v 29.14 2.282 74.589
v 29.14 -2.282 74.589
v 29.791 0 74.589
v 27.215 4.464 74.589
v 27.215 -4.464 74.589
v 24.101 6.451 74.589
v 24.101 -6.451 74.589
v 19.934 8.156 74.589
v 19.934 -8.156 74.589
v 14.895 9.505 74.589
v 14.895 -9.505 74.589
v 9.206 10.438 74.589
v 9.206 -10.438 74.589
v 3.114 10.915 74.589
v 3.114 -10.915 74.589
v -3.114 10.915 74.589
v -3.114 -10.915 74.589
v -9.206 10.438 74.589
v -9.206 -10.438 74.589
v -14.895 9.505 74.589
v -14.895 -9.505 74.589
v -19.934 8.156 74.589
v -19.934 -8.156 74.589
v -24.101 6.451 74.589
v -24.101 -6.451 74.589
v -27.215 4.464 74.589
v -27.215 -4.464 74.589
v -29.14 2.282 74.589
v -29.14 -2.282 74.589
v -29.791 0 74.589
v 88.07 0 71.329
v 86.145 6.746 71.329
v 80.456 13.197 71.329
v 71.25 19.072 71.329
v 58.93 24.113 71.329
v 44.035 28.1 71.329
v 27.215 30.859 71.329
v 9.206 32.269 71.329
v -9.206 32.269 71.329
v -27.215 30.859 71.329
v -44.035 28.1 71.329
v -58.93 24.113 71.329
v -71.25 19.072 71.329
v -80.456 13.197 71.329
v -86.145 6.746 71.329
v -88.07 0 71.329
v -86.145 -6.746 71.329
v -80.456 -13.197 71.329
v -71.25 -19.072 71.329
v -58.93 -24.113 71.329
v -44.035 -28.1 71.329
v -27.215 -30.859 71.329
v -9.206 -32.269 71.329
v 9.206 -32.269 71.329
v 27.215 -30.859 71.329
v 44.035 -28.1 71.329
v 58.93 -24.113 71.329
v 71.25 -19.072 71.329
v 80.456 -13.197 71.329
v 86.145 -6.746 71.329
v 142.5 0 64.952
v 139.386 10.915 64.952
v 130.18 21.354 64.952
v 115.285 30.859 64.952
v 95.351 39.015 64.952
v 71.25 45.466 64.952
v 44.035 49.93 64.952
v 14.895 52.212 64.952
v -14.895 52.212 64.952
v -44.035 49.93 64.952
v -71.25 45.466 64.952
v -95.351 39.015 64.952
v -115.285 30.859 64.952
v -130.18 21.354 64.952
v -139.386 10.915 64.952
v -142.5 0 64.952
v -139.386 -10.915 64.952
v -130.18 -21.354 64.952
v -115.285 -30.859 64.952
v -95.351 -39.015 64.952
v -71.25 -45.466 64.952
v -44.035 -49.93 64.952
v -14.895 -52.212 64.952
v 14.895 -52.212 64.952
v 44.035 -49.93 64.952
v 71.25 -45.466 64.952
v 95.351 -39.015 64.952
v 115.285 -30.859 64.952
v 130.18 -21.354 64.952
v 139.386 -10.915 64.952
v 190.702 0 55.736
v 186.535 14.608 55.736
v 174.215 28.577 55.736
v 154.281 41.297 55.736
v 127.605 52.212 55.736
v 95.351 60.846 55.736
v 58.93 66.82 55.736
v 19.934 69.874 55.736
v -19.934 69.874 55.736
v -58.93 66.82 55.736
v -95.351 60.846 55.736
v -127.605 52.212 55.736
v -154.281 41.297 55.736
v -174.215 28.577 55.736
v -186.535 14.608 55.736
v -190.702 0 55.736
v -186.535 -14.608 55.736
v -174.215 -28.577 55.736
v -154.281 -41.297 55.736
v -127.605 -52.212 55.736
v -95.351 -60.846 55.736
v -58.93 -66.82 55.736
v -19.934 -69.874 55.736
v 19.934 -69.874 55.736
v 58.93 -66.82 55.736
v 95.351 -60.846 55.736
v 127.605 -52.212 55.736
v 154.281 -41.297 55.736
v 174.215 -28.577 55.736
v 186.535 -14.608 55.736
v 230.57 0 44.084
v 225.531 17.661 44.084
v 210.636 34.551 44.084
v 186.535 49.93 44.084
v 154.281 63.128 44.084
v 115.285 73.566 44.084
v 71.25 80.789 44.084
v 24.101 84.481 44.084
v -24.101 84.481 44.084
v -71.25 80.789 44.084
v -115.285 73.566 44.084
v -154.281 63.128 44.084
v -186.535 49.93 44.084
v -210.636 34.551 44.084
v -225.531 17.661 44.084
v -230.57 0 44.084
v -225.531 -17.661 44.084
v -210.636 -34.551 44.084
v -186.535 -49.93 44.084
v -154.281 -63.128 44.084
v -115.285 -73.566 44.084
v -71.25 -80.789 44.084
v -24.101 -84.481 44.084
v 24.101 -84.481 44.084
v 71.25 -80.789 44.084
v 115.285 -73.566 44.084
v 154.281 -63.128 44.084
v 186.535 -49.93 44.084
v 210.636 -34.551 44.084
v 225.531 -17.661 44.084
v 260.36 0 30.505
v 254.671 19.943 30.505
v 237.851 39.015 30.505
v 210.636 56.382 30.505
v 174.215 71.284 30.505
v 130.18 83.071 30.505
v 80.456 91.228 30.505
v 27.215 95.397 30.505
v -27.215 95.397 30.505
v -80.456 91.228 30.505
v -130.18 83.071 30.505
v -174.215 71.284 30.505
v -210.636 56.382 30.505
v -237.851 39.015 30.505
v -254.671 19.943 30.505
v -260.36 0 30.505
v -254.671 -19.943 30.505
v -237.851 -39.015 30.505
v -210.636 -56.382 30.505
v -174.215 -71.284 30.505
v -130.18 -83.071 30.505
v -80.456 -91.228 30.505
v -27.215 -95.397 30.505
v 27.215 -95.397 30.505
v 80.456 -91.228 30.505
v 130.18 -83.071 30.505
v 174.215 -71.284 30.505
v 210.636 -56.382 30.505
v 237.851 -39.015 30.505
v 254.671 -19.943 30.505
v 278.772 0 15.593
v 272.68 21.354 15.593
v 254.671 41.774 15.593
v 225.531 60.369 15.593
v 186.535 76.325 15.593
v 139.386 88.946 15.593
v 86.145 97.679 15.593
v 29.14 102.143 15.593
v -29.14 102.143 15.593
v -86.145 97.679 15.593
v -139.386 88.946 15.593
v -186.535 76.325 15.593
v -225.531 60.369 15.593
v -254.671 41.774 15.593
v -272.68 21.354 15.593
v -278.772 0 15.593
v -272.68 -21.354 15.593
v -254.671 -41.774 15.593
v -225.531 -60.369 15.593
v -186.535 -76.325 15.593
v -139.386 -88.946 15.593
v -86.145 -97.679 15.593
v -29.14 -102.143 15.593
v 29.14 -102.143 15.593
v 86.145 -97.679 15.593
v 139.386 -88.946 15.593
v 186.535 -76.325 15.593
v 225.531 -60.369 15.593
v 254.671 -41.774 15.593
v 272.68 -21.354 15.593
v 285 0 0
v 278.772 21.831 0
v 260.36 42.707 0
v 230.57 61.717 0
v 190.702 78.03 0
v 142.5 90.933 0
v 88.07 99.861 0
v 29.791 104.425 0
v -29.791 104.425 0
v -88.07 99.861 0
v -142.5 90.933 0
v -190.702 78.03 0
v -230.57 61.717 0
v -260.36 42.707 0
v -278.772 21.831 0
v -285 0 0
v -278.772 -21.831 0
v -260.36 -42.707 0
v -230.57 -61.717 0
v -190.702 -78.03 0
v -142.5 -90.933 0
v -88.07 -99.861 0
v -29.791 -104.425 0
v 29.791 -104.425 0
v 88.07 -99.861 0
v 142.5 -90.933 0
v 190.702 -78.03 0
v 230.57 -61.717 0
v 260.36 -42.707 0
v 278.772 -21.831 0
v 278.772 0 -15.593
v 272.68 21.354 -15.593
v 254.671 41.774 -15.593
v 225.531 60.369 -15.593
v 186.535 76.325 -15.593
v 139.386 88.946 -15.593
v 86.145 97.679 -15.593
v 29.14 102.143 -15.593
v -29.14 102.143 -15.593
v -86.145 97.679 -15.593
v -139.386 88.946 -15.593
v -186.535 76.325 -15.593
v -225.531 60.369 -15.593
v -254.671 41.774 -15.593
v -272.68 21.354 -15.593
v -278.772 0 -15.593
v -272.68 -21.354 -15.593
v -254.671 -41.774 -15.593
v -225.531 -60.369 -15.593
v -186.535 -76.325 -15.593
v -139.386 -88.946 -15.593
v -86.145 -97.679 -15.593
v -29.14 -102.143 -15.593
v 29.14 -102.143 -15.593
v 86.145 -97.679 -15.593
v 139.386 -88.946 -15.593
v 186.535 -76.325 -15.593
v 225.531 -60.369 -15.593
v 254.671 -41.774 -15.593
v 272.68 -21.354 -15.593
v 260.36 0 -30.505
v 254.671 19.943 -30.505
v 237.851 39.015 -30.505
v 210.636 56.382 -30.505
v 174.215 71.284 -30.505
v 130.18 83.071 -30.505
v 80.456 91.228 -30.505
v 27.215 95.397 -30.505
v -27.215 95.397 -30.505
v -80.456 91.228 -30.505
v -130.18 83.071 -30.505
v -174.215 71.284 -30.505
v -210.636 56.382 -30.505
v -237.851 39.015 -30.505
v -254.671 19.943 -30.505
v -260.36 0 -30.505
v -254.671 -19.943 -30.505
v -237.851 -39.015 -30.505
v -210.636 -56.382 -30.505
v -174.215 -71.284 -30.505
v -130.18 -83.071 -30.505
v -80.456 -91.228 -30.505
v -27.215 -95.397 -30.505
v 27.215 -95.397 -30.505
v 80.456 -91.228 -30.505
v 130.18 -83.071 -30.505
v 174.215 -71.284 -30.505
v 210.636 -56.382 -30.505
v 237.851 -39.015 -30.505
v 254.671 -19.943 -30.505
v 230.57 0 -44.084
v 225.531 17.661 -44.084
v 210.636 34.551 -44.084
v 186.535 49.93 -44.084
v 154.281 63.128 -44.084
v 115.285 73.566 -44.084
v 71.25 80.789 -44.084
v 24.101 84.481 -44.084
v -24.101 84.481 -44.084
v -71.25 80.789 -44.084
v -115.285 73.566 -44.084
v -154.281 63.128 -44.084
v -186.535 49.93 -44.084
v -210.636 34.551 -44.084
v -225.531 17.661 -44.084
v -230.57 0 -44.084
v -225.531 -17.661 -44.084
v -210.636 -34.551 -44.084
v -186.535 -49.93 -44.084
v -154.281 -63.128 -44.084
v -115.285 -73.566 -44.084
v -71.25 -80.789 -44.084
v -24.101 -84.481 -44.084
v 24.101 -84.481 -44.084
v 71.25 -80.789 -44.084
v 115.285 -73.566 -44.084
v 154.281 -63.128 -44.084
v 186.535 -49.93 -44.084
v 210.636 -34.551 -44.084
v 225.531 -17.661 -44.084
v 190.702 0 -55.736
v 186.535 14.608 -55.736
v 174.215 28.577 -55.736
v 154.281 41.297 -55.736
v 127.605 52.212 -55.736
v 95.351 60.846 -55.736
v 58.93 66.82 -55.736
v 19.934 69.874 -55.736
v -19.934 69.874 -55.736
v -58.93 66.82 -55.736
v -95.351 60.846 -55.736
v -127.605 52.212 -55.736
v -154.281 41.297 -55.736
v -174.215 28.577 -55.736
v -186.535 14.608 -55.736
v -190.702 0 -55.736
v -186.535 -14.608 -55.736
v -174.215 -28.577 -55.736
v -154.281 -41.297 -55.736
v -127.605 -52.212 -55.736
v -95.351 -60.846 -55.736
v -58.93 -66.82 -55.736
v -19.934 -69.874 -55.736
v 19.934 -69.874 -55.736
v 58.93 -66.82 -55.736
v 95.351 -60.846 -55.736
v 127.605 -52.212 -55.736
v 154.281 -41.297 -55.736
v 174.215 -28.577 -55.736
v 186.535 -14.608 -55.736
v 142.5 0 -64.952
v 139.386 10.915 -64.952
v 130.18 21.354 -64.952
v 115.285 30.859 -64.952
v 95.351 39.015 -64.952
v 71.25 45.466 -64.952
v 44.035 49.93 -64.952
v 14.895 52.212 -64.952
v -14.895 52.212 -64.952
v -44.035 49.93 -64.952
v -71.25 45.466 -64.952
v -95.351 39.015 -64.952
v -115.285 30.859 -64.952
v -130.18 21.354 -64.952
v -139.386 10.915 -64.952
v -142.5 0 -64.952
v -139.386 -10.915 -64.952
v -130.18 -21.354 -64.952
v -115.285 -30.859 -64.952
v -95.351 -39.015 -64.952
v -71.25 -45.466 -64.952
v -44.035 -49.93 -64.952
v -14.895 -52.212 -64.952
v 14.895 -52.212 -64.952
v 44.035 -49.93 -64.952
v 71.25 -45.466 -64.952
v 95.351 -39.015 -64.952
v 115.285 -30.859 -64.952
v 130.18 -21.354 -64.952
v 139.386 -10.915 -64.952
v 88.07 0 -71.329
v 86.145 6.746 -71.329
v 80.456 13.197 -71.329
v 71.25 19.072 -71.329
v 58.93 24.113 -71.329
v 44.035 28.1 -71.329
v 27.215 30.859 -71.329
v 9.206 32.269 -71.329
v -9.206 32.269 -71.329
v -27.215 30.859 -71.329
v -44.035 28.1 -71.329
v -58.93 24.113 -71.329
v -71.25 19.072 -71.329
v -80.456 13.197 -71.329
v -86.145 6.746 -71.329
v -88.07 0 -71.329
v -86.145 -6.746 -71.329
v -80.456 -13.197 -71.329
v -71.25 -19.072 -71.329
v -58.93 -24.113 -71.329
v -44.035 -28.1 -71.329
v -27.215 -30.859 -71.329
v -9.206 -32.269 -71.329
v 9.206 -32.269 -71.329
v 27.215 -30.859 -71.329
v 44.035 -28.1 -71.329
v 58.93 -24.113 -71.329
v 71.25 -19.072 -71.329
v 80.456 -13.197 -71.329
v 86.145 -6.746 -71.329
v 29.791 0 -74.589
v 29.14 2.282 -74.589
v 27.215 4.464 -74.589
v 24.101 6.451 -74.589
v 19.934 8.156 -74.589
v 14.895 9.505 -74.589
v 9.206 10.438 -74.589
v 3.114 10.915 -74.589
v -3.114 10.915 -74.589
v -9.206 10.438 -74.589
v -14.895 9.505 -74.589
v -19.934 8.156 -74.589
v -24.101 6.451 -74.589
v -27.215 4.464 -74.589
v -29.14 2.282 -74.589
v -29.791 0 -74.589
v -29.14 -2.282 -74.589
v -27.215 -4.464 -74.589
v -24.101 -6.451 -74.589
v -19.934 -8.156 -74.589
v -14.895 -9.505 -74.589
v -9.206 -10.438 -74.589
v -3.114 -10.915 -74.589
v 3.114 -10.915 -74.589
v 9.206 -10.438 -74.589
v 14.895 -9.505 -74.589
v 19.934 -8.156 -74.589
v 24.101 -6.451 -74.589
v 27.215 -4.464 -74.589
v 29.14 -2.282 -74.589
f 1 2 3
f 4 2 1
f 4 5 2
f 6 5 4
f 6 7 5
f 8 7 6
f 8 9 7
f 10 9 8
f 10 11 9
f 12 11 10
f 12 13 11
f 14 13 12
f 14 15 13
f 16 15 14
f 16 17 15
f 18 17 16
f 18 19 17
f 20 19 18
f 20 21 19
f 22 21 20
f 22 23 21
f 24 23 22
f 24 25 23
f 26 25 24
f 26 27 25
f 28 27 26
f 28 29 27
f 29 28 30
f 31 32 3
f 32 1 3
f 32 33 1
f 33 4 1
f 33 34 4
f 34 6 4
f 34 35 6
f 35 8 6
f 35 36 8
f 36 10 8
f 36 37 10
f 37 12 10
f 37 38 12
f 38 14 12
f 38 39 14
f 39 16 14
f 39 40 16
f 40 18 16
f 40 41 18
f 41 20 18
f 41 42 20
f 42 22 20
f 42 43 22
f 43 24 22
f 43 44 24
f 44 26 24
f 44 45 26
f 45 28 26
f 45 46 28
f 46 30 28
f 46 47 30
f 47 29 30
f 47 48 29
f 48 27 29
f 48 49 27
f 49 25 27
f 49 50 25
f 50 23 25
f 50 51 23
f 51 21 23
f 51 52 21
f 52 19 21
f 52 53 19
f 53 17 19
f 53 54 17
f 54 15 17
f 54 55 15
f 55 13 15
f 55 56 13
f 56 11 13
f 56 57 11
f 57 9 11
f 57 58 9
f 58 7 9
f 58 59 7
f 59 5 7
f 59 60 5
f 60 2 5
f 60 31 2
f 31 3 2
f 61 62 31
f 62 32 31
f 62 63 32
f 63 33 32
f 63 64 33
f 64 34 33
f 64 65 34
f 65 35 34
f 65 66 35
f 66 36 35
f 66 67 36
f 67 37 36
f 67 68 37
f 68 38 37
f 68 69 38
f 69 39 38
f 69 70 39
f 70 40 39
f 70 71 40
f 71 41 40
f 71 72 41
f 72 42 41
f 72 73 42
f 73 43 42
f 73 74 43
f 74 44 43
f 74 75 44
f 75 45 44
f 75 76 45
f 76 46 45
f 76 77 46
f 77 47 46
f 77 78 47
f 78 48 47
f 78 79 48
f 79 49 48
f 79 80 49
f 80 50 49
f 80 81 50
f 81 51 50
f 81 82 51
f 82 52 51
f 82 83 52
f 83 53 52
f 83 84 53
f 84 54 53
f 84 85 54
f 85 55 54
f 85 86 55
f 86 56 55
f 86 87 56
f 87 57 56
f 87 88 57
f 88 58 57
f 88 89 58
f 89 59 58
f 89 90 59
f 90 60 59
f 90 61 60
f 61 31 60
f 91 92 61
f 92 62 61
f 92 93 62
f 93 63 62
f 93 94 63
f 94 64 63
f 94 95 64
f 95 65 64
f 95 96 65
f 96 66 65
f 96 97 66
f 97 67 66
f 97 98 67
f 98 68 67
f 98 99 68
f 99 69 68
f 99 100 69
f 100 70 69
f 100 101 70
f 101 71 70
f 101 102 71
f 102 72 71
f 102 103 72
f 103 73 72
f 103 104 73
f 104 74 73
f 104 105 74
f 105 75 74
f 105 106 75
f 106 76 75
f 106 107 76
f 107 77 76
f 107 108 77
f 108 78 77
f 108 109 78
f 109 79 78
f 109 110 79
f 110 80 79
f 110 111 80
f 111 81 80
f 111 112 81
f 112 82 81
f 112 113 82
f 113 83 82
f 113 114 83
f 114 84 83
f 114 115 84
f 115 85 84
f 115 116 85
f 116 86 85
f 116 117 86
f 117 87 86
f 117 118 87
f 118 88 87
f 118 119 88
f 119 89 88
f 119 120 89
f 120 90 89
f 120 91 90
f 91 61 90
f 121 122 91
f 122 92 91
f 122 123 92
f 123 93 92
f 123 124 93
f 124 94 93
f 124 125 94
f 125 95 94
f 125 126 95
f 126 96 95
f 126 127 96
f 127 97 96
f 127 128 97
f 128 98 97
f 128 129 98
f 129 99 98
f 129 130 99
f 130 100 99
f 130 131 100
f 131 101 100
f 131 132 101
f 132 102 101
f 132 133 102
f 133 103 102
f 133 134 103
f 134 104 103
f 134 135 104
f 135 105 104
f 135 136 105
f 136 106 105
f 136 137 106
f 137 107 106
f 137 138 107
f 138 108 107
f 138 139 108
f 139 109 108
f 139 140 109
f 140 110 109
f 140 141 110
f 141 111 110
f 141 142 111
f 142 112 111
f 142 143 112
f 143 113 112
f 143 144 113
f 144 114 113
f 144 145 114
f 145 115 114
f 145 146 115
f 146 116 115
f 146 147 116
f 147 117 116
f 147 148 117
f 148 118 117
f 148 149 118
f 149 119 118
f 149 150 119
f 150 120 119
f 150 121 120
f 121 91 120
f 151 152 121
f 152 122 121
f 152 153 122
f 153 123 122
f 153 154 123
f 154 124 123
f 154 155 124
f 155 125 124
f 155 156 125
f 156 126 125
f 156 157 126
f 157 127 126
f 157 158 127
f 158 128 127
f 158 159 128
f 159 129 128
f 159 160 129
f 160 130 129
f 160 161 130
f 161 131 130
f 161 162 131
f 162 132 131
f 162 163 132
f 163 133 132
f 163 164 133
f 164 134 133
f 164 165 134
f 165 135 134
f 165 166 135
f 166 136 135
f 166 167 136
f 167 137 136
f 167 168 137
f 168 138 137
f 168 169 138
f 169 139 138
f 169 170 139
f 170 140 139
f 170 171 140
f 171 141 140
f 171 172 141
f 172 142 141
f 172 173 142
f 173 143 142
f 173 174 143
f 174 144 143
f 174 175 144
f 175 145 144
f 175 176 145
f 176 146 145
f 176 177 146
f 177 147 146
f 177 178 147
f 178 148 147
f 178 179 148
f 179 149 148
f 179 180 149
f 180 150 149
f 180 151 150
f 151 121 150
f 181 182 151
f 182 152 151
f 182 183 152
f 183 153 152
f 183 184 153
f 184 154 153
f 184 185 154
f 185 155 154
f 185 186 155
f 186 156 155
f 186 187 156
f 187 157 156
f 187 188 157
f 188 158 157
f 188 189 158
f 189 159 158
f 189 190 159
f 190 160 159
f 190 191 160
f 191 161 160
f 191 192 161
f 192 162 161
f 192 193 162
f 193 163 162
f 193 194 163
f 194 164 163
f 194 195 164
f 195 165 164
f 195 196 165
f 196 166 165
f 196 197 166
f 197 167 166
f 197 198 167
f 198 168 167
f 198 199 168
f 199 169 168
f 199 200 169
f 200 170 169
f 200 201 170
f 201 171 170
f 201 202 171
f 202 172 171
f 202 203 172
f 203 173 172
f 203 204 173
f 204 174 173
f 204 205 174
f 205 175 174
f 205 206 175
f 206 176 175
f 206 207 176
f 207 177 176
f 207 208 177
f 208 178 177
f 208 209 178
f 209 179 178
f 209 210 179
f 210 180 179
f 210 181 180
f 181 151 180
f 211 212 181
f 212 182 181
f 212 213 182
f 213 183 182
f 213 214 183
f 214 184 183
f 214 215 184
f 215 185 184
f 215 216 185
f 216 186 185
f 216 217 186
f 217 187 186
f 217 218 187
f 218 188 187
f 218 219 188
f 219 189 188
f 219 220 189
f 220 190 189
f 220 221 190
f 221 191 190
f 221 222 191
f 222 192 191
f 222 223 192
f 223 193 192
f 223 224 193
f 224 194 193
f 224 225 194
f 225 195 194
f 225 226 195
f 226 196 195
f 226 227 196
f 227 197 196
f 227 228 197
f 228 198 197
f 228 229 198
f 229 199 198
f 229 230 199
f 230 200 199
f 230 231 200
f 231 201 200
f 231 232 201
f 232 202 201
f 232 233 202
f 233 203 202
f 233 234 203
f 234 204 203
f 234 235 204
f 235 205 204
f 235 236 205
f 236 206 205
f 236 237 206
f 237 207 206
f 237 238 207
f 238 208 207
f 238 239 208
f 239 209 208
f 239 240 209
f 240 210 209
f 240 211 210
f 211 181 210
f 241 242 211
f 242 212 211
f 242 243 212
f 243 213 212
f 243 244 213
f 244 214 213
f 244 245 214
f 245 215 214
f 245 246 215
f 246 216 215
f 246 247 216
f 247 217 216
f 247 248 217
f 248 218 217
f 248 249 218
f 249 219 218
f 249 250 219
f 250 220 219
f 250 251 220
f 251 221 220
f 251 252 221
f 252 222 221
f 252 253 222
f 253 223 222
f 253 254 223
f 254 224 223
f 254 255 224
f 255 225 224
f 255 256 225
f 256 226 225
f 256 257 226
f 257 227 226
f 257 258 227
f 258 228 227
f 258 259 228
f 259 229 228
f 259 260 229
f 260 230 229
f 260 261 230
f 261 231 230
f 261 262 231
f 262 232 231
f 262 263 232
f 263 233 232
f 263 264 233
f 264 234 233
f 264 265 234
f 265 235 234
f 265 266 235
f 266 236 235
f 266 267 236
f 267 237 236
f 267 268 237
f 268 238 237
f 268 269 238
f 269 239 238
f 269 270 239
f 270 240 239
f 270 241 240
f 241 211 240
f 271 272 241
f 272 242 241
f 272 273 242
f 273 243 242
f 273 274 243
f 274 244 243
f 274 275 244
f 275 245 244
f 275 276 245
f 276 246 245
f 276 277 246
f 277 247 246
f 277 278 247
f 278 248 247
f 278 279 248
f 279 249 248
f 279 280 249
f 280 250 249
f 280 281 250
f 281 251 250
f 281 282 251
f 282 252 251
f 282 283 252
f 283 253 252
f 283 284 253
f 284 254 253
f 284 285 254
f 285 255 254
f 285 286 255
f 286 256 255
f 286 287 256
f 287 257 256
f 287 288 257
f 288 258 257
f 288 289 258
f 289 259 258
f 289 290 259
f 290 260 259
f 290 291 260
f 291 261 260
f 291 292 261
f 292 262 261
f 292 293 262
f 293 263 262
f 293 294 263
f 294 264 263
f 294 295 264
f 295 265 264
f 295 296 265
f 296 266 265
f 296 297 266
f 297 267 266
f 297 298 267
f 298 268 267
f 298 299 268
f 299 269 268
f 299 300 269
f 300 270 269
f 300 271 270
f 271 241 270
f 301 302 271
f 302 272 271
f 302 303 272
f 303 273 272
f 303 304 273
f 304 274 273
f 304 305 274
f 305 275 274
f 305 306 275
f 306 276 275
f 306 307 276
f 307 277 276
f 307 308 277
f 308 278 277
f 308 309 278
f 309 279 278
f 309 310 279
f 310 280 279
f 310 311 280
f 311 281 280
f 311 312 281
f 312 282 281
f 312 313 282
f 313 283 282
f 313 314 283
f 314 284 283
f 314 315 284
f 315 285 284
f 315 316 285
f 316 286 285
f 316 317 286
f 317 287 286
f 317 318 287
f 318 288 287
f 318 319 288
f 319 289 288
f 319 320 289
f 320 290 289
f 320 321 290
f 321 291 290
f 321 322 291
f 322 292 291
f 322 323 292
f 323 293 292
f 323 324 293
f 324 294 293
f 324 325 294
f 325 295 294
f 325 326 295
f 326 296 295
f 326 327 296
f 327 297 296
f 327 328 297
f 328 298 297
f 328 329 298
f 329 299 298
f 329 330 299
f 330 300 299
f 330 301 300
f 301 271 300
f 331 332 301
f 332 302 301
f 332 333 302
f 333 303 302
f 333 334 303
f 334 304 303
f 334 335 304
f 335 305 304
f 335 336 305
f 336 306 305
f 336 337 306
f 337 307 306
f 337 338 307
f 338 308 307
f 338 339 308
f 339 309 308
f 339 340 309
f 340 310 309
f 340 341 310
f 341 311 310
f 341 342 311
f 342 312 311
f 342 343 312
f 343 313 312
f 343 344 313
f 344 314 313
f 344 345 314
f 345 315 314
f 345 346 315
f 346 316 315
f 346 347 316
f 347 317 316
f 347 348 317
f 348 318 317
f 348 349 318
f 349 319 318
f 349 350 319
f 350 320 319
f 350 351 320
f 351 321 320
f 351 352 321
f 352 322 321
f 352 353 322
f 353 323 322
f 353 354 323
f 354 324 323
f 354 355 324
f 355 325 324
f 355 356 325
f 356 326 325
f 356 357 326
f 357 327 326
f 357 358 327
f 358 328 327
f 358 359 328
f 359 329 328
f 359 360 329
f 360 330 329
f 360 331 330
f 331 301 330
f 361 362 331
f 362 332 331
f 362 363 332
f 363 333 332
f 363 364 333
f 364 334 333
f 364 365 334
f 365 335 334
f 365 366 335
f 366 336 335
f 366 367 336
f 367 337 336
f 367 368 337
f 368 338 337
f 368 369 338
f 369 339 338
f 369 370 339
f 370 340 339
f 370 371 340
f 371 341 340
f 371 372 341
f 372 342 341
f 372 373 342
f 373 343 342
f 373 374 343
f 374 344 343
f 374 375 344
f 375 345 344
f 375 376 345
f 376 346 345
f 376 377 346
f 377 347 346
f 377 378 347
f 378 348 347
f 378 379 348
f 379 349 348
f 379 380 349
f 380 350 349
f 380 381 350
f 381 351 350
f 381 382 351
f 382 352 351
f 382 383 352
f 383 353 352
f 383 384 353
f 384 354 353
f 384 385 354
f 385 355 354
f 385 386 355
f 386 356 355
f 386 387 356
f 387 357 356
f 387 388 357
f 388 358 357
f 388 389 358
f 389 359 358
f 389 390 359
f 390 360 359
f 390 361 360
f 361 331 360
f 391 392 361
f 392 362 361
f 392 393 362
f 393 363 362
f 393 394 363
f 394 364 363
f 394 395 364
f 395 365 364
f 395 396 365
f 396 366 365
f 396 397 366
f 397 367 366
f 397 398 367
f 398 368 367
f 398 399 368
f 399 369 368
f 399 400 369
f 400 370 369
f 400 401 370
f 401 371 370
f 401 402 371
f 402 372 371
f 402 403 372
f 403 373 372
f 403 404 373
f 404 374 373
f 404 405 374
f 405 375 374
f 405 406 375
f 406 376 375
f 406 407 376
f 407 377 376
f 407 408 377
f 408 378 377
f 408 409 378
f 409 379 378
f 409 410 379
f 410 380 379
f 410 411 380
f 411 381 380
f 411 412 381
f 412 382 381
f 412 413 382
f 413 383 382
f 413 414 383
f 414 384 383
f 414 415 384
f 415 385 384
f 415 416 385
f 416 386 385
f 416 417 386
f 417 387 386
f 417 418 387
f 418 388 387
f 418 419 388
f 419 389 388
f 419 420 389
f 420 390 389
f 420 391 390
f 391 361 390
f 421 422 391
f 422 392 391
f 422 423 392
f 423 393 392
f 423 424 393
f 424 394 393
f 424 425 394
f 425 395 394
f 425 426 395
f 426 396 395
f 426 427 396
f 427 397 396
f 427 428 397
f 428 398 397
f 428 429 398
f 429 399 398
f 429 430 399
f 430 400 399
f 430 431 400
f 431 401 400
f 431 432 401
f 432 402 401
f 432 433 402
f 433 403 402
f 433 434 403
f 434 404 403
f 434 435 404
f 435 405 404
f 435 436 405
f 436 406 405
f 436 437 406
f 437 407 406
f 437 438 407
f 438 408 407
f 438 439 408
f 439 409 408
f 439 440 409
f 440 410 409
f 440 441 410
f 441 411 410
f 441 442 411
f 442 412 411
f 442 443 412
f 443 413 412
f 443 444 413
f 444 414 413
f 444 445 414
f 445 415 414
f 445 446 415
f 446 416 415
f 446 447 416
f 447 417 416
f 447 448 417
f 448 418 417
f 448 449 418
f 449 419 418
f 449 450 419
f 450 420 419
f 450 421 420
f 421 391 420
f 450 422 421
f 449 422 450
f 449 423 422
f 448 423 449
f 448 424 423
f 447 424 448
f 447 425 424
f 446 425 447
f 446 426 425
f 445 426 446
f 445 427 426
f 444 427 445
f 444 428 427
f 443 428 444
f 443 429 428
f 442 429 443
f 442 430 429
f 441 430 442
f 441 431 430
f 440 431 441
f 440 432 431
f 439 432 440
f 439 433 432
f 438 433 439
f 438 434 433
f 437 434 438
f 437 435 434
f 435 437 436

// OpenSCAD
// Generated by SolidPython 1.0.1 on 2020-07-29 00:46:53


scale(v = [19, 7, 5]) {
	sphere(r = 15);
}
/***********************************************
*********      SolidPython code:      **********
************************************************
 
# import packages: SolidPython
from solid import *
from solid.utils import *
from itertools import chain, combinations, permutations


class Resize:

    def __init__(self, scad_file):
        self.scad_file = scad_file
        #self.scad_file = import_scad(scad_file)
        # cone/cylinder param:
        self.r1 = 0
        self.r2 = 0
        self.h = 0
        # rectangular prism param:
        self.w = 0
        self.l = 0
        # ellipse param:
        self.r = 0

    # import OpenScad code (file name corresponds to shape)


    # classify shape + parameters
    def assign(self, param1, param2, param3):
        if self.scad_file == 'cone.scad':
            self.r1 = param1
            self.r2 = param2
            self.h = param3
        elif self.scad_file == 'cylinder.scad':
            self.r1 = param1
            self.r2 = param2
            self.h = param3
        elif self.scad_file == 'rectangularPrism.scad':
            self.h = param1
            self.l = param2
            self.w = param3
        else:
            self.r = param1
            self.h = param2

    # resize parameters
    def iterate(self):
        x = range(3, 20, 2)
        i = 1
        if self.scad_file == 'cone.scad':
            tempList = list(permutations(x, 2))
            for temp in tempList:
                param1 = temp[0]
                param2 = temp[1]
                filepath = 'produced_scad_files/' + 'cone' + str(param1) + '_' + str(param2) + '_' + '.scad'
                scad_render_to_file(cylinder(h=param1, r1=param2, r2=0), filepath)

        elif self.scad_file == 'cylinder.scad':
            tempList = list(permutations(x, 3))
            for temp in tempList:
                param1 = temp[0]
                param2 = temp[1]
                filepath = 'produced_scad_files/' + 'cylinder' + str(param1) + '_' + str(param2) + '_' + '.scad'
                scad_render_to_file(cylinder(h=param1, r1=param2, r2=param2), filepath)

        elif self.scad_file == 'rectangularPrism.scad':
            tempList = list(permutations(x, 3))
            for temp in tempList:
                param1 = temp[0]
                param2 = temp[1]
                param3 = temp[2]
                filepath = 'produced_scad_files/' + 'rectangularPrism' + str(param1) + '_' + str(param2) + '_' + str(
                    param3) + '.scad'
                scad_render_to_file(cube(size=(param1, param2, param3)), filepath)

        elif self.scad_file == 'ellipse.scad':
            tempList = list(permutations(x, 4))
            for temp in tempList:
                param1 = temp[0]
                param2 = temp[1]
                param3 = temp[2]
                param4 = temp[3]
                filepath = 'produced_scad_files/' + 'ellipse' + str(param1) + '_' + str(param2) + '_' + str(param3) + '_' + str(param4) + '.scad'
                scad_render_to_file(scale([param1, param2, param3])(sphere(r=param4)), filepath)

    def render_to_scadfile(self):
        scad_render_to_file(scad, 'example.scad') 
 
************************************************/
